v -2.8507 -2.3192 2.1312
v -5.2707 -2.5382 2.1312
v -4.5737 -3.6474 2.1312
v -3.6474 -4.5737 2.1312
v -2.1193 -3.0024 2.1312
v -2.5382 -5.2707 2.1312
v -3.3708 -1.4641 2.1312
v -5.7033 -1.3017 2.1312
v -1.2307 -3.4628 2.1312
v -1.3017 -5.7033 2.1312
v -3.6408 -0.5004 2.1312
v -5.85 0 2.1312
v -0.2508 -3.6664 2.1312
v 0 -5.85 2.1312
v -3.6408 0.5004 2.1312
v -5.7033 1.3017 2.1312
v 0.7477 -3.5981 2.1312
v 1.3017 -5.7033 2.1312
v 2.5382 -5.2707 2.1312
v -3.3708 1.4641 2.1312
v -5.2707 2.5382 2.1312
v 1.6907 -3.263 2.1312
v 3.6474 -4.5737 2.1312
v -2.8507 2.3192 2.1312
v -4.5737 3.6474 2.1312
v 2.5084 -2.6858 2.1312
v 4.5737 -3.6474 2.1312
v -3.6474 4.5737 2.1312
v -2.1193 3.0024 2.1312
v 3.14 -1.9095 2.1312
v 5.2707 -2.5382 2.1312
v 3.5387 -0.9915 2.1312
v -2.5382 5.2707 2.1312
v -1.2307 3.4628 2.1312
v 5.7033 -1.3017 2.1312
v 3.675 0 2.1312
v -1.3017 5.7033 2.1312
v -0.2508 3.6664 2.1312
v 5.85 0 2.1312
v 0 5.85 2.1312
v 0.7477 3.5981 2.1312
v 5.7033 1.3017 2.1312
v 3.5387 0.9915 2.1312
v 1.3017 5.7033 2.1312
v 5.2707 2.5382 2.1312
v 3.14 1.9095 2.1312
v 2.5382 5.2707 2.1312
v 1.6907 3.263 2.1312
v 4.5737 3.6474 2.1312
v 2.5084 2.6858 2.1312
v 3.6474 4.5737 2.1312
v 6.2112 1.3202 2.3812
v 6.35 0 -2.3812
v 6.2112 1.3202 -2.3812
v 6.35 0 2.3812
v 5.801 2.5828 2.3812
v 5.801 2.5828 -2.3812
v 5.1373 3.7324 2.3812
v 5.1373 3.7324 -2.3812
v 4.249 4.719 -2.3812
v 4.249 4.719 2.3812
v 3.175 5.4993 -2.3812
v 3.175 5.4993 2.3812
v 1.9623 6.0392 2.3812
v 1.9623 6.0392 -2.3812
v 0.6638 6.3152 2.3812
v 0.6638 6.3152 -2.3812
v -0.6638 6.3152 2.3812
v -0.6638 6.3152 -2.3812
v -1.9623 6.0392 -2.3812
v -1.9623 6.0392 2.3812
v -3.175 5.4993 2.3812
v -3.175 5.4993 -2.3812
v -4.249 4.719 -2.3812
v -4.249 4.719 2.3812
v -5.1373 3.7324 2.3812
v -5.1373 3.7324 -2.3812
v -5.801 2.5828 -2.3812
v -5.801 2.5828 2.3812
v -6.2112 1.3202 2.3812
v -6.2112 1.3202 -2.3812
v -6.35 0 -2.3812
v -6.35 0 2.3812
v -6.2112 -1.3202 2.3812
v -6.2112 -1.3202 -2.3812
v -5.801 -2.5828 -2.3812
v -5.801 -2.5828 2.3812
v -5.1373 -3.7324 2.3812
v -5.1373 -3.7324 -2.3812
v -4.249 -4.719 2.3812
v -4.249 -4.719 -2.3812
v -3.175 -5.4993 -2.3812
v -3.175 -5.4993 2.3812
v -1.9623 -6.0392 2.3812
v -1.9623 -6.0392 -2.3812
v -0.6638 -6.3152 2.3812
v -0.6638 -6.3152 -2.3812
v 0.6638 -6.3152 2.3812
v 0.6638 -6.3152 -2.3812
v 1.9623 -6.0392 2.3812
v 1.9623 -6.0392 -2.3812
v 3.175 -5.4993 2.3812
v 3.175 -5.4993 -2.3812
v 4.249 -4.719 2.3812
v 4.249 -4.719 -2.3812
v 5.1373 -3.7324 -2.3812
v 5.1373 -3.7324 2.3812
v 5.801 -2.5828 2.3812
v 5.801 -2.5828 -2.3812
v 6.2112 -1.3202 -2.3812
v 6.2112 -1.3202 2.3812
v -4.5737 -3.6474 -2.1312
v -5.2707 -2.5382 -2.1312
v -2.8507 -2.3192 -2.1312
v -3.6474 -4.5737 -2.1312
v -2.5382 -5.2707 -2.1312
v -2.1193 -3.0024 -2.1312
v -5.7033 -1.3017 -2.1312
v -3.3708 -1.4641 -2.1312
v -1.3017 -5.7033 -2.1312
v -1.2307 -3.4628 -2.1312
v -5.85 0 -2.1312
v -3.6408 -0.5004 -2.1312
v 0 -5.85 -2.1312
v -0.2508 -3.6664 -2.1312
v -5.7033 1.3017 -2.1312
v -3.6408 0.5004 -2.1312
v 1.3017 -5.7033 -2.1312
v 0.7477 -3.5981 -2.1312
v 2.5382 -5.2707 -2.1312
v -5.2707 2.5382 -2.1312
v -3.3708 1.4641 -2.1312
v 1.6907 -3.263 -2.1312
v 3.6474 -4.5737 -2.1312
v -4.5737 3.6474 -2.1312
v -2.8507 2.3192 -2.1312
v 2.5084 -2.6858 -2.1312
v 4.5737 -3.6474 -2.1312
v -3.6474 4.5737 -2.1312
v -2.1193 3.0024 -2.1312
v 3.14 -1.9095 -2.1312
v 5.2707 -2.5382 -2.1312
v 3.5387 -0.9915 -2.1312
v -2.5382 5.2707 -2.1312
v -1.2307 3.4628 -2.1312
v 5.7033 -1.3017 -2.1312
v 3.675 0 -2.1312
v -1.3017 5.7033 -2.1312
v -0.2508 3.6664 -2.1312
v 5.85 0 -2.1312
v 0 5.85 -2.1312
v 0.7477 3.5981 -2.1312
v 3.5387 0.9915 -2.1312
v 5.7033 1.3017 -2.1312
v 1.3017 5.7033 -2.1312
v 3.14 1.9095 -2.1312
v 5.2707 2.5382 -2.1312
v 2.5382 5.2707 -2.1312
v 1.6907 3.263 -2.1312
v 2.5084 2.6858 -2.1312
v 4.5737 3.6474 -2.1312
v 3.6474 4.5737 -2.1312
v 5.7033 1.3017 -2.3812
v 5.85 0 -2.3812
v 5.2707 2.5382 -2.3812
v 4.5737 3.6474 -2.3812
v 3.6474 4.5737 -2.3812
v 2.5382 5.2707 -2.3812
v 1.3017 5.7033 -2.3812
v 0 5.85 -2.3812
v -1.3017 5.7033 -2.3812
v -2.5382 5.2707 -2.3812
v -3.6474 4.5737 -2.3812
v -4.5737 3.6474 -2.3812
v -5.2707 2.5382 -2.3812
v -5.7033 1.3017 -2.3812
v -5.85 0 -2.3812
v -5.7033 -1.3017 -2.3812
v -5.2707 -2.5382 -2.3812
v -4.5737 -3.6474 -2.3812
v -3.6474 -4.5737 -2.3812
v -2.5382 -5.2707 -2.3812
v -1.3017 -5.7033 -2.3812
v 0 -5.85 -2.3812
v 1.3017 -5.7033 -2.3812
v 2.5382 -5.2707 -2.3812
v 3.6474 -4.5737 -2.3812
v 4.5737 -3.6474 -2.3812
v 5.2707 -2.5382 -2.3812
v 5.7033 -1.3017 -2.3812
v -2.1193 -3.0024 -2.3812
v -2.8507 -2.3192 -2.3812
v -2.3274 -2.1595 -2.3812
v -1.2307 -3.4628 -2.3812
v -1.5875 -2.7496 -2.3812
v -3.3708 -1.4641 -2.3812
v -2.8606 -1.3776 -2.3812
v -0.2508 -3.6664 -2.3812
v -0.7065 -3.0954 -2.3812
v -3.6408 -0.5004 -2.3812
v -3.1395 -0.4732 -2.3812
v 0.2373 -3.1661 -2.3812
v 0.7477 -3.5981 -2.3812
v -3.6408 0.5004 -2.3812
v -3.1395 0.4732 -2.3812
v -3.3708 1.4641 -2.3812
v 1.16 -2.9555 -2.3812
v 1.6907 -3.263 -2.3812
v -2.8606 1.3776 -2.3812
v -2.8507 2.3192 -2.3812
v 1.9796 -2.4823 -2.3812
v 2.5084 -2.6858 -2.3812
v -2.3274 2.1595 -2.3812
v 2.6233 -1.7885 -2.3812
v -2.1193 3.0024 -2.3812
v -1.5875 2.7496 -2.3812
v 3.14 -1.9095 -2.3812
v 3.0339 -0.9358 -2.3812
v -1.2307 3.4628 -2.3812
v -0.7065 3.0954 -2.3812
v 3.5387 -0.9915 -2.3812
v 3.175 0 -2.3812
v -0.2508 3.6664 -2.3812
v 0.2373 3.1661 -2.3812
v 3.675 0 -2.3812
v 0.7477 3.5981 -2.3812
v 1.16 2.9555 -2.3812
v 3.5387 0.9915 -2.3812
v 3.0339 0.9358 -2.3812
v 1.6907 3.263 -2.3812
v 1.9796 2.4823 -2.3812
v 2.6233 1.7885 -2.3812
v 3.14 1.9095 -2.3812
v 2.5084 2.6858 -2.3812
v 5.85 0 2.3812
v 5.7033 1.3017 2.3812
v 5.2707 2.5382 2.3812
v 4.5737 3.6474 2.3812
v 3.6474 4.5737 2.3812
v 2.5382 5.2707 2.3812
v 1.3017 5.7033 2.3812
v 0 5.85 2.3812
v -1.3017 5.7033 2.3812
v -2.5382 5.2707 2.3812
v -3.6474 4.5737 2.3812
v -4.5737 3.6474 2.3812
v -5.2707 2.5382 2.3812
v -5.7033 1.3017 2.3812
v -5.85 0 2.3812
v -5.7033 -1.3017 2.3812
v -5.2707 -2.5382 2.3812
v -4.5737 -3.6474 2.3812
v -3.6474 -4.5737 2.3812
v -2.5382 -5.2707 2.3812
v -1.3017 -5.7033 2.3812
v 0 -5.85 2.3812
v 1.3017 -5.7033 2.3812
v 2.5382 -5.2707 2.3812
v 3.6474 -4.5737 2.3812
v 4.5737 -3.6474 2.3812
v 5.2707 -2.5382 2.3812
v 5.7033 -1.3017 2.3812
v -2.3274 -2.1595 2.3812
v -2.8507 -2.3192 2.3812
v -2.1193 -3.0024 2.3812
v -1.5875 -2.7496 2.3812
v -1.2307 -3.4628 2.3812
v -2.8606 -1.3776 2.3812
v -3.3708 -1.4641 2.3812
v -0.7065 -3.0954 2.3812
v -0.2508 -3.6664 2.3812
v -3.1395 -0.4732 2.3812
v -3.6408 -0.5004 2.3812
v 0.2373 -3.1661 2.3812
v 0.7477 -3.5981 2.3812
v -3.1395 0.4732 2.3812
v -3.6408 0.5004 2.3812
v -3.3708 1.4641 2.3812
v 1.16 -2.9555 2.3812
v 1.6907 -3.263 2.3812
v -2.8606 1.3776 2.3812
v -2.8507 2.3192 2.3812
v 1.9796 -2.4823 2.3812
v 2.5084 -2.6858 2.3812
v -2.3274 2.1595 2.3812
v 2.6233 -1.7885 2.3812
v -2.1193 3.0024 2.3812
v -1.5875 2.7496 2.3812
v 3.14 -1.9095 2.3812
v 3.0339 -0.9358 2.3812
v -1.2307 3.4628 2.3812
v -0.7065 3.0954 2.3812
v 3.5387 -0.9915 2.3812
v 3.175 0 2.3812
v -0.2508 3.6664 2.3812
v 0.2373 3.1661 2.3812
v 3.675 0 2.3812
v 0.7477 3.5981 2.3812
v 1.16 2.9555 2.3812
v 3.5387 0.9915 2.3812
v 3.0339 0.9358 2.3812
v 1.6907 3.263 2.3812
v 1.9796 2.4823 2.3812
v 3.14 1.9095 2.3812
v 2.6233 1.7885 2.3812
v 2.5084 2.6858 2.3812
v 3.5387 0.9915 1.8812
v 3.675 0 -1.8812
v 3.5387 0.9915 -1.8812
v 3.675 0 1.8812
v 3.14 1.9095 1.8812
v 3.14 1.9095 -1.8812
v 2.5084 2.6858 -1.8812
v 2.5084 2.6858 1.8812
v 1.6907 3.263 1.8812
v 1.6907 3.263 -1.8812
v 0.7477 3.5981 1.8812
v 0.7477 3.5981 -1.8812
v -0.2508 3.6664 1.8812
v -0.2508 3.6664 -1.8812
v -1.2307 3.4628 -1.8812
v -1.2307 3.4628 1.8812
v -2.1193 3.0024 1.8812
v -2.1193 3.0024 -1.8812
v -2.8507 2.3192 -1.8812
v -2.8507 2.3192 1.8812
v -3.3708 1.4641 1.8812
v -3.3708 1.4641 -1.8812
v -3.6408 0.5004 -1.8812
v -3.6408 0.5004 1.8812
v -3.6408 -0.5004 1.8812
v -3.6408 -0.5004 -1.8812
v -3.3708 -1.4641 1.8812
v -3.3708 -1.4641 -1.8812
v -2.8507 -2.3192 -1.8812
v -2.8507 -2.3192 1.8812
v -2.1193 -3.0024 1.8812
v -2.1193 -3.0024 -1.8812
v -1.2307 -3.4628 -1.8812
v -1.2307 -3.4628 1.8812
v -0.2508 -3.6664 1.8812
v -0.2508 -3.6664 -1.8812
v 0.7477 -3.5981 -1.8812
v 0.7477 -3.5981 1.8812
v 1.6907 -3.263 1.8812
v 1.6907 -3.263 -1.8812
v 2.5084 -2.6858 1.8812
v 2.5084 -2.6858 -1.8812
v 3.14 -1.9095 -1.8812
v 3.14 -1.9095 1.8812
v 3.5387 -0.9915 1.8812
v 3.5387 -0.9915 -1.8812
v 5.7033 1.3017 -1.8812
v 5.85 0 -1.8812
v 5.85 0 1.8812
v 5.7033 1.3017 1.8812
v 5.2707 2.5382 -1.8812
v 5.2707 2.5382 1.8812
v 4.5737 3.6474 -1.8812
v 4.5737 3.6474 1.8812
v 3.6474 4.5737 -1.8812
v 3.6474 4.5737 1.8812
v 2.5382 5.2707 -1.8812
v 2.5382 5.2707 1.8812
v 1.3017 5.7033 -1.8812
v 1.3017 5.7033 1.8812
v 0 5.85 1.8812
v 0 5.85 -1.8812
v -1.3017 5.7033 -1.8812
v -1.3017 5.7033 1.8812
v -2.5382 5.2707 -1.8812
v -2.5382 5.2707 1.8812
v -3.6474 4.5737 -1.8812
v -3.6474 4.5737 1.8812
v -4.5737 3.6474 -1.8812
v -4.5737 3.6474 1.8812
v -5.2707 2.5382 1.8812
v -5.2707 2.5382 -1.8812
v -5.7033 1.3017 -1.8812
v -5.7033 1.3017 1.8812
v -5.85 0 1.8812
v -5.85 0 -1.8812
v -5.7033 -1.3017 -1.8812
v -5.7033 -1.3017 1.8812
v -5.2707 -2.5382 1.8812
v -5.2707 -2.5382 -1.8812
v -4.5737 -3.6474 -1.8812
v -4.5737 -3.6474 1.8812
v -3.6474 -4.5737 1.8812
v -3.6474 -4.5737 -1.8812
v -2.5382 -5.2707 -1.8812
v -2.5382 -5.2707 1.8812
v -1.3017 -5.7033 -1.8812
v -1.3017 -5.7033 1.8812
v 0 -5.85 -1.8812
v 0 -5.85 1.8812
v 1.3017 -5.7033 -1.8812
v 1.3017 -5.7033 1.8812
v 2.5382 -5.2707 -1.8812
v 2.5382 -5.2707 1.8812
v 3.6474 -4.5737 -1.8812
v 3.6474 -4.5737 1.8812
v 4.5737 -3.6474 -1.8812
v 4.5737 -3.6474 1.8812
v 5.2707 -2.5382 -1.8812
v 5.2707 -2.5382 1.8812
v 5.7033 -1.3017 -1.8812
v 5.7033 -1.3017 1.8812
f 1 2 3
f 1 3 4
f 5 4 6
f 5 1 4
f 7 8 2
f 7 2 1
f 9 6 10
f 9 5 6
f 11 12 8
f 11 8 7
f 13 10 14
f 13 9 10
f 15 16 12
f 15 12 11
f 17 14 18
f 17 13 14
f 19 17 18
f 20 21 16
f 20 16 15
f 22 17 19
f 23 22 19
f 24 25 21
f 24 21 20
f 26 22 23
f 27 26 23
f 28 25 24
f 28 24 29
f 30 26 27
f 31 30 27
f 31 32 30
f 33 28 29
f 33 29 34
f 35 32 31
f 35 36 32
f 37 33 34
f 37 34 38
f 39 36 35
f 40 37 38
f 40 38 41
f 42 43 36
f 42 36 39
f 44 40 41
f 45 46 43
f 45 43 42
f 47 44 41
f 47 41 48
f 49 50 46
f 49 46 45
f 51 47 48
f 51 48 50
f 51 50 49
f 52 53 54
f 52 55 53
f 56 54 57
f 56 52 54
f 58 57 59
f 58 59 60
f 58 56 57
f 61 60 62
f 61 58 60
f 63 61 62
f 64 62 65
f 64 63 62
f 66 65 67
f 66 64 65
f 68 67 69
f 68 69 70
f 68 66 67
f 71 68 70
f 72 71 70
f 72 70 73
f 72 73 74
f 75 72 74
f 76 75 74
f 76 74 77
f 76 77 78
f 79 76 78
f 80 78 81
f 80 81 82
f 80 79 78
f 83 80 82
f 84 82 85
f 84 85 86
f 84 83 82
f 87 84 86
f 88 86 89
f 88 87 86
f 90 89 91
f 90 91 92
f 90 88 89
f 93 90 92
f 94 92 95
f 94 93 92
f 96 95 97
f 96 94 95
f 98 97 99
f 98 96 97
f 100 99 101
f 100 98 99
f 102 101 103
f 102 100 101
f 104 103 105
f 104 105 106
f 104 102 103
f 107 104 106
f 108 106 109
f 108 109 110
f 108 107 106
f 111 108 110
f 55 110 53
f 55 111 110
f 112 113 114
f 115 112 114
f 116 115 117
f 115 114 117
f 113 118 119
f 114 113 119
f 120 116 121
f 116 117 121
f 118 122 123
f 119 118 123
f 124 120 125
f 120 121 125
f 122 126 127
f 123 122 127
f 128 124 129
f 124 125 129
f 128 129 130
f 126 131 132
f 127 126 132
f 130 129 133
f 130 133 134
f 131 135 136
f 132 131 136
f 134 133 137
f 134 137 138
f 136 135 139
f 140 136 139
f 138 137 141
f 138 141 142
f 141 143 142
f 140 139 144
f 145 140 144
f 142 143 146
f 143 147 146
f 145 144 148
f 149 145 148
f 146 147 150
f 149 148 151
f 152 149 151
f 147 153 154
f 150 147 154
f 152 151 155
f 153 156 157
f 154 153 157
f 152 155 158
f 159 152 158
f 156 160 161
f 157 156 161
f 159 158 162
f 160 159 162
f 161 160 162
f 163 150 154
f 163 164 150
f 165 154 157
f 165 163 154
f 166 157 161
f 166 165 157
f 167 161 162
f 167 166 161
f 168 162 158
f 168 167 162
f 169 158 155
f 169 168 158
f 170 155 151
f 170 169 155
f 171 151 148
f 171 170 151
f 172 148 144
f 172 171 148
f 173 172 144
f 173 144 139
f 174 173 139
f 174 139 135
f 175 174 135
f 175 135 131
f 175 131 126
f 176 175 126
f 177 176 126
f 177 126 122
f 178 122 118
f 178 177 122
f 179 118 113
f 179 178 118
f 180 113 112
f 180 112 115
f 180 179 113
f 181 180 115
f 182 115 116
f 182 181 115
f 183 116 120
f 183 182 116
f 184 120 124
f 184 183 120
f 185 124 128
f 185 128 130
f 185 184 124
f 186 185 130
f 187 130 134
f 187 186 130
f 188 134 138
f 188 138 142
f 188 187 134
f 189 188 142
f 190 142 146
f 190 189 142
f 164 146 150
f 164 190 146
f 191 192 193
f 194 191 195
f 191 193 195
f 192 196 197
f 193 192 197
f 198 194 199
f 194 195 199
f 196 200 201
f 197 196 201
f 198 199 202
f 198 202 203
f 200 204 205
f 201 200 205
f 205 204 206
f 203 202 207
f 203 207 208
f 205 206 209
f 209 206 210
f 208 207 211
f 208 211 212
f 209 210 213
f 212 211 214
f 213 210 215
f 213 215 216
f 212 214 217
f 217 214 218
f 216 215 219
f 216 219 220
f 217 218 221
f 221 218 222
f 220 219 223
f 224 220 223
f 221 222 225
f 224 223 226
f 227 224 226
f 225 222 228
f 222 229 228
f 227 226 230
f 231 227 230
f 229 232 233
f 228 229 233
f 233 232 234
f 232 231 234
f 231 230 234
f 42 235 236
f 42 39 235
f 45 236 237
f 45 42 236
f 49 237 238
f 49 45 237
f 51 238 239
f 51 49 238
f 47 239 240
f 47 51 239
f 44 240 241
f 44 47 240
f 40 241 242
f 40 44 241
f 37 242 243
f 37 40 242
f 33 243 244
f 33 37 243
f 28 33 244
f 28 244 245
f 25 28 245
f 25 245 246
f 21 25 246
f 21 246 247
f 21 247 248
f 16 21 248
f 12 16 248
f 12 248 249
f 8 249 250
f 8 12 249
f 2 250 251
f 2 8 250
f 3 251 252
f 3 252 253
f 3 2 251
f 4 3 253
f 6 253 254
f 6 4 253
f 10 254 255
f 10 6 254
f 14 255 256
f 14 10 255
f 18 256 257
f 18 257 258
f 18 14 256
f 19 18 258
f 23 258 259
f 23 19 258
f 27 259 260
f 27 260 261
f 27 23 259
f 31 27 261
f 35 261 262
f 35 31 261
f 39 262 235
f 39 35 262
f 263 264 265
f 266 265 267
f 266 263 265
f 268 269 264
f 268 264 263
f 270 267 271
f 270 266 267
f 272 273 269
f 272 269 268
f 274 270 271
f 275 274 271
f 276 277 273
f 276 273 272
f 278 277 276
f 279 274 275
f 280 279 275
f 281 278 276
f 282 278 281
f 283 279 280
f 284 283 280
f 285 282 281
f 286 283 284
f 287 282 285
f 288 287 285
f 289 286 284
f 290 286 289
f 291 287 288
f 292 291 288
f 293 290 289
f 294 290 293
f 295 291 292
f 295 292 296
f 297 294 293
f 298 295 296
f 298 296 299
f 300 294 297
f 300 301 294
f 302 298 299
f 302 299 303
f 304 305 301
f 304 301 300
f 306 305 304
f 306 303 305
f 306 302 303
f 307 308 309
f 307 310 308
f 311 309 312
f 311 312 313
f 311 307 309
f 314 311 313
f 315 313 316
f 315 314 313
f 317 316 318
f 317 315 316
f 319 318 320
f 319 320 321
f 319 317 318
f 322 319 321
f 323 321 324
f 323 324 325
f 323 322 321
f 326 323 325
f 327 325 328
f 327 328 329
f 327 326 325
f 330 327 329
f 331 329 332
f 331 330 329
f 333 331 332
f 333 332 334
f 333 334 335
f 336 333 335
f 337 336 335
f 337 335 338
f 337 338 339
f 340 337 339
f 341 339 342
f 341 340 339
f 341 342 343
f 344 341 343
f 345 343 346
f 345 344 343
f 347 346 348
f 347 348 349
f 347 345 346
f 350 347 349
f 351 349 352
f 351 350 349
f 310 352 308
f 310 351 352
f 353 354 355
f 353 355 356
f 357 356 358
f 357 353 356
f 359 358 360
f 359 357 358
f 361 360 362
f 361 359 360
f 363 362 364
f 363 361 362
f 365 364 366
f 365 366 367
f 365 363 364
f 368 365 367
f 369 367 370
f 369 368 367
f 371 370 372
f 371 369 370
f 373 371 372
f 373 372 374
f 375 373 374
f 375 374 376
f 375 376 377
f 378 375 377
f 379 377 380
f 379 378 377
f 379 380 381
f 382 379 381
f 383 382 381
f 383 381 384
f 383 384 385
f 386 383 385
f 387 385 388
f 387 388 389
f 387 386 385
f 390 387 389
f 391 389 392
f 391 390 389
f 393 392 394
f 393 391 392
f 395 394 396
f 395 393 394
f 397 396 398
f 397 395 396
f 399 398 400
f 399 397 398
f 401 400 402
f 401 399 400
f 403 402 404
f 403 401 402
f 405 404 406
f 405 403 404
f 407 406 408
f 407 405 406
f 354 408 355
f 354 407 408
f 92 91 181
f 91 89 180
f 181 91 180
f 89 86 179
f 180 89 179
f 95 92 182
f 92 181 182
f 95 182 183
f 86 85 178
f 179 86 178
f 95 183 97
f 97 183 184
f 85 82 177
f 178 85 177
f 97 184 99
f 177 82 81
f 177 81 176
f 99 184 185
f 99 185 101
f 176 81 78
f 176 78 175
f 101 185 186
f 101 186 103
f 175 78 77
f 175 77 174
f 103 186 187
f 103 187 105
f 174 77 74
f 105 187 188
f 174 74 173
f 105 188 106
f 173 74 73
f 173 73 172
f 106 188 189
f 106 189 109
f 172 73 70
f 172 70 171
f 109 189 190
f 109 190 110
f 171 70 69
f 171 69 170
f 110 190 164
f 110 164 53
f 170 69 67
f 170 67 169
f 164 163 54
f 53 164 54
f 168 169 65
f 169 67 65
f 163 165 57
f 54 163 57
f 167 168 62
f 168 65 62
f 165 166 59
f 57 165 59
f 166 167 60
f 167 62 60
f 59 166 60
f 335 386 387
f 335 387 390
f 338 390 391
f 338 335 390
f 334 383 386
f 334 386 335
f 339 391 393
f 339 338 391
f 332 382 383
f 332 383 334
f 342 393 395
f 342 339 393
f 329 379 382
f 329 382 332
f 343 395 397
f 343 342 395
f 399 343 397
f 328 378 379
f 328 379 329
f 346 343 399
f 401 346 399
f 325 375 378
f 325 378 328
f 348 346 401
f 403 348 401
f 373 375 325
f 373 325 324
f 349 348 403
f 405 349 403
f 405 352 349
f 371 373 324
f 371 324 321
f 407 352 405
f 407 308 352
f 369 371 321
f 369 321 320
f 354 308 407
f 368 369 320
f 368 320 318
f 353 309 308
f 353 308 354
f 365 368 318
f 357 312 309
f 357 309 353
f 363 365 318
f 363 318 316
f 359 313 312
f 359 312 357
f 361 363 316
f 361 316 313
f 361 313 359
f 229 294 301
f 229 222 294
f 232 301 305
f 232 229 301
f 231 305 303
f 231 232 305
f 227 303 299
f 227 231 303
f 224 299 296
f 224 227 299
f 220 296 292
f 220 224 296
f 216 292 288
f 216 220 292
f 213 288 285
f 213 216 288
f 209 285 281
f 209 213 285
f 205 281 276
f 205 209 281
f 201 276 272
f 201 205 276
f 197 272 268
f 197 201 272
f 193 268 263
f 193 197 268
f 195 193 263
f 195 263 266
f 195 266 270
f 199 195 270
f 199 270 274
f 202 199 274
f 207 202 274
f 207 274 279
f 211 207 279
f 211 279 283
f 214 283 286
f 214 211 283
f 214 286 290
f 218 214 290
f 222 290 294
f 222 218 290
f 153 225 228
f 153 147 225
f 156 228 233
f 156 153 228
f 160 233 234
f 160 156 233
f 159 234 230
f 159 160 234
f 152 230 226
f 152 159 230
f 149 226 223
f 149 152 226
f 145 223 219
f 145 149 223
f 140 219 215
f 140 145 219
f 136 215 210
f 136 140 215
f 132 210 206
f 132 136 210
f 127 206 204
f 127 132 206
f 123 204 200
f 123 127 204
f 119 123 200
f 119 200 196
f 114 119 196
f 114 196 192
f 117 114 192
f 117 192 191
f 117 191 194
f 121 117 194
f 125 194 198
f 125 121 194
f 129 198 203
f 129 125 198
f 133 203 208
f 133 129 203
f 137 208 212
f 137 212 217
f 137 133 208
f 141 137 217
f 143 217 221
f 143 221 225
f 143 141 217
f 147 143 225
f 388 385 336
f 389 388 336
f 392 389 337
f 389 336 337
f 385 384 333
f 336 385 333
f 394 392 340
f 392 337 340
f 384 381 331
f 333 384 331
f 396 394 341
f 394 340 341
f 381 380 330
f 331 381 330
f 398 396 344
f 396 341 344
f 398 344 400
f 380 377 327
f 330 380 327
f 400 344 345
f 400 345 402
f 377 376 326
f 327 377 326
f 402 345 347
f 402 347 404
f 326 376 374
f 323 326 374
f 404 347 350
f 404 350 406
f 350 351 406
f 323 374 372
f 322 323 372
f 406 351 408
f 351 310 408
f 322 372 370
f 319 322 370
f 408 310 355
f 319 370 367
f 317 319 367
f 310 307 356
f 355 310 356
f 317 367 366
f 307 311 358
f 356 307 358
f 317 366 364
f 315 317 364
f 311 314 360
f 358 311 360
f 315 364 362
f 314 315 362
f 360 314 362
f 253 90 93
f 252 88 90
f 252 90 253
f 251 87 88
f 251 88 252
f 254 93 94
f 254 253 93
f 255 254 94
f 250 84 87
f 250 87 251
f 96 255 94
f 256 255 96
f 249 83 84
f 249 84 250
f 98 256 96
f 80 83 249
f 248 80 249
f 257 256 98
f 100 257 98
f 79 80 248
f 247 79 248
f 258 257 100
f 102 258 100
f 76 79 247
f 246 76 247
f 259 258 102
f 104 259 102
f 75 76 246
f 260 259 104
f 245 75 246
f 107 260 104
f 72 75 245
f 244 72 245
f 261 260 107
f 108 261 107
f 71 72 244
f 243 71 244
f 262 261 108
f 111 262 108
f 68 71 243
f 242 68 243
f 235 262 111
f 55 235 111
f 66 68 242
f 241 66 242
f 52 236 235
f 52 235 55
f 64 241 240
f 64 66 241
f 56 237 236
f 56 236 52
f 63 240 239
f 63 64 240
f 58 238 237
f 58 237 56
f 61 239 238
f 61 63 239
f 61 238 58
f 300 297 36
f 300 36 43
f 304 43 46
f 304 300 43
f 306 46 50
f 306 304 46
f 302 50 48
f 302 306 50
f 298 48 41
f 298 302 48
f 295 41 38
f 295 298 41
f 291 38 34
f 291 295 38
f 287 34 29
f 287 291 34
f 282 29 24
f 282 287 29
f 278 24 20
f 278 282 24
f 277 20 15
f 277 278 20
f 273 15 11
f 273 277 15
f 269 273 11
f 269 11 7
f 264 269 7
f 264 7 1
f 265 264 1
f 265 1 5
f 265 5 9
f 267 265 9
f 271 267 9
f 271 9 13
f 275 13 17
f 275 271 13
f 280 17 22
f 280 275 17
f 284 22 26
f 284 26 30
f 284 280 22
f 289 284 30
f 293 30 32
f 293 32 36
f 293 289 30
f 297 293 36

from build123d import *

# Parameters (mm, degrees)
F0_R     = 3.675
F0_R_2   = 3.175
F1_DEPTH = 2.38125
F0_R_3   = 6.35
F0_R_4   = 5.85
F3_R     = 5.85
F3_R_2   = 3.675
F4_DEPTH = 0.25


# Not quite as in the source:
# - a length typed as a fraction of an inch, garbled in the dataset ("3 / 203.2 mm" for 3/8 in), is restored


with BuildPart() as f1:
    # F0 (on Top) → F1 (new body, symmetric)
    with BuildSketch(Plane.XY):
        Circle(F0_R)
        Circle(F0_R_2, mode=Mode.SUBTRACT)
    extrude(amount=F1_DEPTH, both=True)



with BuildPart() as f1b:
    # F0 (on Top) → F1, piece 2 (new body, symmetric)
    with BuildSketch(Plane.XY):
        Circle(F0_R_3)
        Circle(F0_R_4, mode=Mode.SUBTRACT)
    extrude(amount=F1_DEPTH, both=True)


with BuildPart() as f1_1:
    add(f1.part)

    add(f1b.part)  # F4 merges F1b
    # F3 (on offset) → F4 (join)
    with BuildSketch(Plane.XY.offset(1.88125)):
        Circle(F3_R)
        Circle(F3_R_2, mode=Mode.SUBTRACT)
    extrude(amount=F4_DEPTH)

    # F5: F1 across plane


with BuildPart() as f1_2:
    add(f1_1.part)
    add(f1_1.part.mirror(Plane.XY))


solid = f1_2.part
